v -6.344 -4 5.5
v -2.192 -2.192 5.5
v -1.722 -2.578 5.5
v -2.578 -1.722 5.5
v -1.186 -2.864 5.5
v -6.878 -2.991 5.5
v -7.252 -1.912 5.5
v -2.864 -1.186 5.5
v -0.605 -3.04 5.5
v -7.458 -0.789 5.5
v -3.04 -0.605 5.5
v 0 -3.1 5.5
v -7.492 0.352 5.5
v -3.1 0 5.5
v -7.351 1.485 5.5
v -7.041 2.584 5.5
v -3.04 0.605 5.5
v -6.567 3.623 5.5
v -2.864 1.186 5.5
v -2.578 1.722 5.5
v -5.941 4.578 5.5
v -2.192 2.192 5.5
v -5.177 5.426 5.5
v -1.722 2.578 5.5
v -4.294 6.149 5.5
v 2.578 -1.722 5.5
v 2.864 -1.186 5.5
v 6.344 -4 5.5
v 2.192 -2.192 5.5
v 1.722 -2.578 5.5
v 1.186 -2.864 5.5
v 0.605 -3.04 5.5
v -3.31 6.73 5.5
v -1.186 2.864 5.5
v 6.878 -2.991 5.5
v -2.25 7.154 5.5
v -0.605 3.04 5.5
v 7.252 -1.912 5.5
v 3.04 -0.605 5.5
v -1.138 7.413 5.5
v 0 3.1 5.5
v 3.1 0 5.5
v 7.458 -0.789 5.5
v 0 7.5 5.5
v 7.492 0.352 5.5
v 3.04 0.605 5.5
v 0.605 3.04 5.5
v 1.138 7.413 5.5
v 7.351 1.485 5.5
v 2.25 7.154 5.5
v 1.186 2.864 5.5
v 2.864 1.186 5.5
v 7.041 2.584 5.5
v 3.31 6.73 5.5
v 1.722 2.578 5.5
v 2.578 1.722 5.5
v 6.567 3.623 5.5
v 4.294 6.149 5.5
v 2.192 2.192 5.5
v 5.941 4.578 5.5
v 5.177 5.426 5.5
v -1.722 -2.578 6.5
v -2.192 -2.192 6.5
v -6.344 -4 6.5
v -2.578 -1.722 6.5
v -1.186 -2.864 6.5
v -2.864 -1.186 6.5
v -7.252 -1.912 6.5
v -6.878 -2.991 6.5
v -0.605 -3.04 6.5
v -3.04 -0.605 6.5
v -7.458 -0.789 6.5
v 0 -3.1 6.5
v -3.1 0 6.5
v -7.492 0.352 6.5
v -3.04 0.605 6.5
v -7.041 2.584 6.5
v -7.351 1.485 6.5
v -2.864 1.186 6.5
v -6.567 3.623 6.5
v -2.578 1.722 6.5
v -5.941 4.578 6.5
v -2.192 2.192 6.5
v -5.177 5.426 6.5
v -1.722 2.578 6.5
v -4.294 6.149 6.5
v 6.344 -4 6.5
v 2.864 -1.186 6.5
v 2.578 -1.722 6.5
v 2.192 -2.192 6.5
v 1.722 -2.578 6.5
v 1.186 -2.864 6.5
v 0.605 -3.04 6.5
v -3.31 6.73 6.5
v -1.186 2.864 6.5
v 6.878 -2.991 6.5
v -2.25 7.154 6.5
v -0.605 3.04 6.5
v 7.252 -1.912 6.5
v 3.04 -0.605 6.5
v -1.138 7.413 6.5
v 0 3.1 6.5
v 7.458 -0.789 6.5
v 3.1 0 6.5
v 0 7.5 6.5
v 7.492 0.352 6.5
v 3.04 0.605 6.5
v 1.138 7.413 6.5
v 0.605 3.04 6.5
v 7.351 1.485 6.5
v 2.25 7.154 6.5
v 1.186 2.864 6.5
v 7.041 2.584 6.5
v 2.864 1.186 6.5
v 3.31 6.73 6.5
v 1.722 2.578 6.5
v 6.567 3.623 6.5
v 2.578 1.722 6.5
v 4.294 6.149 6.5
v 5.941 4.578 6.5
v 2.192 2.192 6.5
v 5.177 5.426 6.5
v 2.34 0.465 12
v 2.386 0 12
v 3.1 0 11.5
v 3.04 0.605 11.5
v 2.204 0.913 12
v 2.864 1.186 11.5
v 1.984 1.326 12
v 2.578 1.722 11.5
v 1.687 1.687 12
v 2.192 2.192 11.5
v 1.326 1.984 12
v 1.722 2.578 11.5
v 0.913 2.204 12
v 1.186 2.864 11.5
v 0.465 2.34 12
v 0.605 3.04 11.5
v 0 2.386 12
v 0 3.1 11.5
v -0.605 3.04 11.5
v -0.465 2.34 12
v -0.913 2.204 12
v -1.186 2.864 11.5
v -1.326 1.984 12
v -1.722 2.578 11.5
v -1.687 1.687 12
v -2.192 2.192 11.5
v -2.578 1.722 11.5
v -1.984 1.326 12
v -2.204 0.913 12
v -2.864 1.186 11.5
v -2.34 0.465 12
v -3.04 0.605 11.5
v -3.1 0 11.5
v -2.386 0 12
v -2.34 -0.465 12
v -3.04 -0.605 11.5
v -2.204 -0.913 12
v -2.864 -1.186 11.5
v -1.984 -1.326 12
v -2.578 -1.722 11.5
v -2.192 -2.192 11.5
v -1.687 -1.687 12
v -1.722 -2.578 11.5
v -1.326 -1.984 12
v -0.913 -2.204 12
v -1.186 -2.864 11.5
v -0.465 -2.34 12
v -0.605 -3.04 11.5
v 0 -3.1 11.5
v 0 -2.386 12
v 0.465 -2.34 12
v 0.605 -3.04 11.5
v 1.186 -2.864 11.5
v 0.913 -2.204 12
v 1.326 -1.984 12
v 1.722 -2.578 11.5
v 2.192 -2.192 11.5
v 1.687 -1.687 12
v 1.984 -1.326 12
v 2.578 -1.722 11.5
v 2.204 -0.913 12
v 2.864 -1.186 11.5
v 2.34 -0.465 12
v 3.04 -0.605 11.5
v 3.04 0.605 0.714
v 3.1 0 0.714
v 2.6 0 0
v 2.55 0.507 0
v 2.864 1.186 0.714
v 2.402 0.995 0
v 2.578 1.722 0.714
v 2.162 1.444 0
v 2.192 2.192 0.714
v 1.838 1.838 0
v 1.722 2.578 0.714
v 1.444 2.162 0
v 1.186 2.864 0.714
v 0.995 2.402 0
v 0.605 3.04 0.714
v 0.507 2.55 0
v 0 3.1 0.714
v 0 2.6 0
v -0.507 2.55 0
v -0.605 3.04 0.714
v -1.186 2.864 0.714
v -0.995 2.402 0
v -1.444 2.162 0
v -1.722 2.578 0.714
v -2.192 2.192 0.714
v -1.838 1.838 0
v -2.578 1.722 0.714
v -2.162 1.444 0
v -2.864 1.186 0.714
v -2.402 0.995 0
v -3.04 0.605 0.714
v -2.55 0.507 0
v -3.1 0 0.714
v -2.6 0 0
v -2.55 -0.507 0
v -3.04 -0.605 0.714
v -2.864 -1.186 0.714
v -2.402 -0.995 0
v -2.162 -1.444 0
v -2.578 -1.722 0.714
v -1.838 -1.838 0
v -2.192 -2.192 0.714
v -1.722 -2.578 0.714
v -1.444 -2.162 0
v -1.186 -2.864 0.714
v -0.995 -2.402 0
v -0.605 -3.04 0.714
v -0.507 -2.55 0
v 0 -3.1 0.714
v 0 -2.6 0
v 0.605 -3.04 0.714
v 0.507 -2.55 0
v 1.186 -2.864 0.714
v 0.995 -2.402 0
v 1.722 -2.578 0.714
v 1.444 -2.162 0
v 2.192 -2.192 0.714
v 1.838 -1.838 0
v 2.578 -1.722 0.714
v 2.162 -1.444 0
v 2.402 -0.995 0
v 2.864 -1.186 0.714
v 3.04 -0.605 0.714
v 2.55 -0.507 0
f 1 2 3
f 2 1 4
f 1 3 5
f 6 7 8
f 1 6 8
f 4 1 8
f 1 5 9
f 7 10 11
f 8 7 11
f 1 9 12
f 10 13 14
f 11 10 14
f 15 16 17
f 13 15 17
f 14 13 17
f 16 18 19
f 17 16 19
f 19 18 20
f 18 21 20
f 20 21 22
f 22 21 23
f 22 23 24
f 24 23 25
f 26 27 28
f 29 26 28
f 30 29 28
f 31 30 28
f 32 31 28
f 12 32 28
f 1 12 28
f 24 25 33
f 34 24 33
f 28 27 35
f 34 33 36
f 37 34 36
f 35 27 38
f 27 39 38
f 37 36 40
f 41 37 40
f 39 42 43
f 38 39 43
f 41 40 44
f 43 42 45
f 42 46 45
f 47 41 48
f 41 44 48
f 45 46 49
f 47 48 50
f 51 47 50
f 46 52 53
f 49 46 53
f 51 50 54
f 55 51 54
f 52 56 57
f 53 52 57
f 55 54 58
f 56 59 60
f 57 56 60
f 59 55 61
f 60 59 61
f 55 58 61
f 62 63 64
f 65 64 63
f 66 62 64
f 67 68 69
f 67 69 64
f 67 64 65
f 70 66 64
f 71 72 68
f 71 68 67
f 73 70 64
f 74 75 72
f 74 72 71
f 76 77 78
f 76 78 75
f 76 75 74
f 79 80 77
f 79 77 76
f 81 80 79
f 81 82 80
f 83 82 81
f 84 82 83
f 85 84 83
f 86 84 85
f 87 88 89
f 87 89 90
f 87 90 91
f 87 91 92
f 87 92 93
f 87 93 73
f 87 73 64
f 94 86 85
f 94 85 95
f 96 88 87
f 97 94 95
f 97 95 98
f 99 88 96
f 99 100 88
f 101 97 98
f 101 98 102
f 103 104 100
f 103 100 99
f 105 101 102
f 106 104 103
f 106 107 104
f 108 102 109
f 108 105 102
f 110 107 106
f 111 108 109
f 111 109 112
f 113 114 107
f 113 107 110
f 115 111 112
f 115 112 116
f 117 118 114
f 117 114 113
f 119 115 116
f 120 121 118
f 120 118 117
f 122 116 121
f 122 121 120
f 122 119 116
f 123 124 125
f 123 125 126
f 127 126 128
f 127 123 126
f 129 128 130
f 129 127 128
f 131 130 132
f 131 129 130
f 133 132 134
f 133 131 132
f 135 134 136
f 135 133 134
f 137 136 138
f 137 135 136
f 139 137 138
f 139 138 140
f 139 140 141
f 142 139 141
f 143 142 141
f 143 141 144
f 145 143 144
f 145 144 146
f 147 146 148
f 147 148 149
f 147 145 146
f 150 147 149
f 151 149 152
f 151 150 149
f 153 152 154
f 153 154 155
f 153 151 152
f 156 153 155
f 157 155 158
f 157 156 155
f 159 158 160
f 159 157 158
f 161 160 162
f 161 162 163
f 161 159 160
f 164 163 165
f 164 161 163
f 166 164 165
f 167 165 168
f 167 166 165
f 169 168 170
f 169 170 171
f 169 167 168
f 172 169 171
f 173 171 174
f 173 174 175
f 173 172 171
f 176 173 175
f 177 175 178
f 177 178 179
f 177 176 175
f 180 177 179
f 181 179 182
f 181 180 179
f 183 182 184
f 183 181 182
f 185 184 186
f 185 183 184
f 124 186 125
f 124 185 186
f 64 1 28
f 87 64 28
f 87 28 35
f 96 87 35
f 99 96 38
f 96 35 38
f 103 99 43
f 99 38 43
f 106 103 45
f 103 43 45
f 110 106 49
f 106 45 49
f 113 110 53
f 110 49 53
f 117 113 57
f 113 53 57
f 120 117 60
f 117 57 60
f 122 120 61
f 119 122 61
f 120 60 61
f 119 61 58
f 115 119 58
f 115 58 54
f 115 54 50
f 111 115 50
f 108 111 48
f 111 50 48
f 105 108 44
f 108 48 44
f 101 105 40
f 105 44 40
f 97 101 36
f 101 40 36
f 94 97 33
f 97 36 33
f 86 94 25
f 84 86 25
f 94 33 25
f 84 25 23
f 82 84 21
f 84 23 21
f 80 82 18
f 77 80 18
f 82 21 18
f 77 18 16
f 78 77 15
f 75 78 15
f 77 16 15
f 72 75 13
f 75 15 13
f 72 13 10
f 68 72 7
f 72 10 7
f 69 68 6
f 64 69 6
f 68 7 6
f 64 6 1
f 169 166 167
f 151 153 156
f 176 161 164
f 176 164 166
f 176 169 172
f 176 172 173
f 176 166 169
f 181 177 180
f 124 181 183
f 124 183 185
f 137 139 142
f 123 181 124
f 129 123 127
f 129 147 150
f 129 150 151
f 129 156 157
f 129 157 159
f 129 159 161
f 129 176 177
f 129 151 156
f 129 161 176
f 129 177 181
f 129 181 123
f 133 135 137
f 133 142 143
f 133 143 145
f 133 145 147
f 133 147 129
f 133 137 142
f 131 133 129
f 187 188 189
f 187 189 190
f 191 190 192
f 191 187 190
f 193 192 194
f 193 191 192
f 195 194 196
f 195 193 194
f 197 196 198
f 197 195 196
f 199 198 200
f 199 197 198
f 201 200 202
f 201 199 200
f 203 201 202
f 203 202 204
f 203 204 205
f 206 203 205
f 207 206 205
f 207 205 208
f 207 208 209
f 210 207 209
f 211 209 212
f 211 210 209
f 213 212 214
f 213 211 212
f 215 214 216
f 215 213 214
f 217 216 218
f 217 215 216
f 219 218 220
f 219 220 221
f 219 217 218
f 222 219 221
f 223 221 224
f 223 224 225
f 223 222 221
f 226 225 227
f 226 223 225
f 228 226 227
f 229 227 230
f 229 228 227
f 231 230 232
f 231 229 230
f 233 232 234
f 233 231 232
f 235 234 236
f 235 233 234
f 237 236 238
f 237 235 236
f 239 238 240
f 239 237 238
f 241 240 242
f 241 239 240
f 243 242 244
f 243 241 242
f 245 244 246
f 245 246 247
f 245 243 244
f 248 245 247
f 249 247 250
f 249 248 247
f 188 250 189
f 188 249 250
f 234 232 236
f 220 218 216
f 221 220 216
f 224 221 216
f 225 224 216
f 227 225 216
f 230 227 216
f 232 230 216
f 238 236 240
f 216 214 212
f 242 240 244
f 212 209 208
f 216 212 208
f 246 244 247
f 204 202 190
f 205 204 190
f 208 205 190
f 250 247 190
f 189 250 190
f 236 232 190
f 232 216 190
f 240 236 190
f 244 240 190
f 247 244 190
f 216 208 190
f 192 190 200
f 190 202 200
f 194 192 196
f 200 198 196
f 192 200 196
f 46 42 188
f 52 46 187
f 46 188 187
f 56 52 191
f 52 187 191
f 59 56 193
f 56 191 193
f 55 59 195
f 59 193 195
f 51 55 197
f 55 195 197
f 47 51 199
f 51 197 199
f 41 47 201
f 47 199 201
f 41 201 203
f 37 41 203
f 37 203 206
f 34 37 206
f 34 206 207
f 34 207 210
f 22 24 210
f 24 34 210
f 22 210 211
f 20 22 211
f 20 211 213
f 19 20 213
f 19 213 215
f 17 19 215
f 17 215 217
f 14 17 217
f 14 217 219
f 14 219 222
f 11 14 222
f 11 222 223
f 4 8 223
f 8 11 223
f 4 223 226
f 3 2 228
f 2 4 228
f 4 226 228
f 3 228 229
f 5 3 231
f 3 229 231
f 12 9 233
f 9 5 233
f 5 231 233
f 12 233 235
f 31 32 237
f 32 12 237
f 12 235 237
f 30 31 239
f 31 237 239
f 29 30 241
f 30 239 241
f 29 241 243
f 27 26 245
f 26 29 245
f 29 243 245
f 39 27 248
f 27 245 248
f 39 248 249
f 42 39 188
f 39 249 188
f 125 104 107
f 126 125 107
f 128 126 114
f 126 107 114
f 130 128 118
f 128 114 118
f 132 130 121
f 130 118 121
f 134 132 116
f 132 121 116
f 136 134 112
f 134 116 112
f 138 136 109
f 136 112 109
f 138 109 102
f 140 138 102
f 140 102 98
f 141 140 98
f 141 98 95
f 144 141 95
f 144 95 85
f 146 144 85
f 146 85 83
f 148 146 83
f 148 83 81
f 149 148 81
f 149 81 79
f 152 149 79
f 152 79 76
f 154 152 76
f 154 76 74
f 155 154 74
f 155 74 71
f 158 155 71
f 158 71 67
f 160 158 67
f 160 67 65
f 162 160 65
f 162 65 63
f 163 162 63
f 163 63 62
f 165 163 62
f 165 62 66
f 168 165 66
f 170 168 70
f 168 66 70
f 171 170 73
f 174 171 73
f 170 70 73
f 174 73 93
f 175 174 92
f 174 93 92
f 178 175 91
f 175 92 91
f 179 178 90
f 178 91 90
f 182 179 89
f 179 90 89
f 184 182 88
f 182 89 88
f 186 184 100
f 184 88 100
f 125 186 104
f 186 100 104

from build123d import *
from OCP.BRepFilletAPI import BRepFilletAPI_MakeChamfer

# Parameters (mm, degrees)
SKETCH1_R                = 3.1
BOSS_EXTRUDE1_DEPTH      = 12
CHAMFER1_SIZE            = 0.5
CHAMFER1_SIZE2           = 0.714074003
BOSS_EXTRUDE2_DEPTH      = 0.5
BOSS_EXTRUDE2_DEPTH_BACK = 0.5


with BuildPart() as part:
    # Sketch1 → Boss-Extrude1 (new body)
    with BuildSketch(Plane.XY):
        Circle(SKETCH1_R)
    extrude(amount=BOSS_EXTRUDE1_DEPTH)

    # Chamfer1: one chamfer whose edges measure the first distance from different faces: ONE call of the kernel's chamfer builder (chamfer() names one face for all edges)
    chamfer1_edges_1 = [part.edges().sort_by_distance(p)[0] for p in [
        (-3.1, 0, 0),
    ]]
    chamfer1_side_1 = [part.faces().sort_by_distance(p)[0] for p in [
        (0, 0, 0),
    ]]
    chamfer1_edges_2 = [part.edges().sort_by_distance(p)[0] for p in [
        (-3.1, 0, 12),
    ]]
    chamfer1_side_2 = [part.faces().sort_by_distance(p)[0] for p in [
        (-3.1, 0, 6),
    ]]
    chamfer1 = BRepFilletAPI_MakeChamfer(part.part.solid().wrapped)
    for e in chamfer1_edges_1:
        chamfer1.Add(CHAMFER1_SIZE, CHAMFER1_SIZE2, e.wrapped, chamfer1_side_1[0].wrapped)  # the first distance lies on this face
    for e in chamfer1_edges_2:
        chamfer1.Add(CHAMFER1_SIZE, CHAMFER1_SIZE2, e.wrapped, chamfer1_side_2[0].wrapped)  # the first distance lies on this face
    add(Compound.cast(chamfer1.Shape()), mode=Mode.REPLACE)

    # Sketch2 → Boss-Extrude2 (add, two sides: drawn at the far end of the back side and taken through both)
    with BuildSketch(Plane.XY.offset(6).offset(-BOSS_EXTRUDE2_DEPTH_BACK)):
        with BuildLine():
            Line((-6.34428877, -4), (6.34428877, -4))
            ThreePointArc((6.34428877, -4), (0, 7.5), (-6.34428877, -4))
        make_face()
    extrude(amount=BOSS_EXTRUDE2_DEPTH + BOSS_EXTRUDE2_DEPTH_BACK)


solid = part.part
